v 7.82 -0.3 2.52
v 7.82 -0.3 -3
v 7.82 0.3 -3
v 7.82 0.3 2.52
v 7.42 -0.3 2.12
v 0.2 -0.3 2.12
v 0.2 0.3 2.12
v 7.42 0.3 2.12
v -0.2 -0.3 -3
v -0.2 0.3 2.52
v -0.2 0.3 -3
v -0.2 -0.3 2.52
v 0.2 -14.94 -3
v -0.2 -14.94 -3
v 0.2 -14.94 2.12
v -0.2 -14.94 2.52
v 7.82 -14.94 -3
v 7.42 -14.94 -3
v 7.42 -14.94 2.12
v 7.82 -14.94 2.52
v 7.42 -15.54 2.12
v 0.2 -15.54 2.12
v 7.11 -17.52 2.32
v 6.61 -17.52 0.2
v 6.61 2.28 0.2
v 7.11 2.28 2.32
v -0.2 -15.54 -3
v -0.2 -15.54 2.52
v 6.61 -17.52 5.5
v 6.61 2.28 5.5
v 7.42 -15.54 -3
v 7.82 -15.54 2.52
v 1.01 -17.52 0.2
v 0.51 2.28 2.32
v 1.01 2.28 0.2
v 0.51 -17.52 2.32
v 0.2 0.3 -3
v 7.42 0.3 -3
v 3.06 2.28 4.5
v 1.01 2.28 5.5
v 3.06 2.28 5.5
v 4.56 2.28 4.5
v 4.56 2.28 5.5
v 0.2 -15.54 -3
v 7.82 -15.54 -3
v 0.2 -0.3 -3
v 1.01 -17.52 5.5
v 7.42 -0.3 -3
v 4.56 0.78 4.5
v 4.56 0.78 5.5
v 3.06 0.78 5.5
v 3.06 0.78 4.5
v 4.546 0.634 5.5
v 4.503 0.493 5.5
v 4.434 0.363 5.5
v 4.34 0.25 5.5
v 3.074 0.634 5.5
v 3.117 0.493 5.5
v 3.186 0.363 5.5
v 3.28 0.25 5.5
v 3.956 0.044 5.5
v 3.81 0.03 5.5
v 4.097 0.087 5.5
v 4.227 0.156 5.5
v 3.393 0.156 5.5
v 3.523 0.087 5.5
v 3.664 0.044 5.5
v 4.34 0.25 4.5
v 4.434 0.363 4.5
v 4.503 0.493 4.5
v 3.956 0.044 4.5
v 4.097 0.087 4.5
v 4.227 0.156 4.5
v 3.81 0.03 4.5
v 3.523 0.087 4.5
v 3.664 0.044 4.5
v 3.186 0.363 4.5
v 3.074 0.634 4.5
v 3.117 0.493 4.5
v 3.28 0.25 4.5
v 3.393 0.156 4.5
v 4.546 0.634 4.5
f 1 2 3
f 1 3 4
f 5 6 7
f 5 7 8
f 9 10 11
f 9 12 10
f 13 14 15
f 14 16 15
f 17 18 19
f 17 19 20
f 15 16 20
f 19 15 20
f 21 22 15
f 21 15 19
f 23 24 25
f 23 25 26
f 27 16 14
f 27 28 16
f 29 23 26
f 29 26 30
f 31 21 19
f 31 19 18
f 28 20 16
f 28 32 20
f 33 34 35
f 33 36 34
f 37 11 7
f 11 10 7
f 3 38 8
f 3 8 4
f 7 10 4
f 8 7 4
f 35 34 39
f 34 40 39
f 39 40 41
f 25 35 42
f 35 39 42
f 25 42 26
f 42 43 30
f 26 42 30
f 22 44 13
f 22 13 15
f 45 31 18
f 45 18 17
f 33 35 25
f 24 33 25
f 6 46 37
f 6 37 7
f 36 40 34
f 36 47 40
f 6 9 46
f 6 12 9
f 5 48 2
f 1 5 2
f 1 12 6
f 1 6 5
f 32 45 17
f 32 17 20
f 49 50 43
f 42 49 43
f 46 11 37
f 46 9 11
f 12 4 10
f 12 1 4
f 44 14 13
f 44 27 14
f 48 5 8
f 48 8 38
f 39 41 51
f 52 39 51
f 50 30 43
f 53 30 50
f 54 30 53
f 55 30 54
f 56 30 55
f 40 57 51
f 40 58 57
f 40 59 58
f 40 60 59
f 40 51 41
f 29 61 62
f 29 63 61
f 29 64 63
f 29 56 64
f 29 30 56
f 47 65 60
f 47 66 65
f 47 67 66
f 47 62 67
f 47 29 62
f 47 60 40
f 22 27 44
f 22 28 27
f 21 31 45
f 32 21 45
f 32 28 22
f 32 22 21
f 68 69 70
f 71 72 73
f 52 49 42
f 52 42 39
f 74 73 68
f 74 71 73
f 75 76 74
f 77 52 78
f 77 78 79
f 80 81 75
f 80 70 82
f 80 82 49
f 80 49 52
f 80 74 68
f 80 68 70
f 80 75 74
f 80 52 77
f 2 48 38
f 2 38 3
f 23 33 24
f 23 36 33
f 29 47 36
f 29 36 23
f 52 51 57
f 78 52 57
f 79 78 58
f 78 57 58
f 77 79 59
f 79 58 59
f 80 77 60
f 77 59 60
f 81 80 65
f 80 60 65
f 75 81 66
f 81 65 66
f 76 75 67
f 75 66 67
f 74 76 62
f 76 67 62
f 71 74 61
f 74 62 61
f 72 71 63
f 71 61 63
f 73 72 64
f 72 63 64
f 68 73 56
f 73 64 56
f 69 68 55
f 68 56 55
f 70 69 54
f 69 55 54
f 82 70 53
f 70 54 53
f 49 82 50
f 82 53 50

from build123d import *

# Parameters (mm, degrees)
PAD001_DEPTH = 0.3
PAD002_DEPTH = 0.3
PAD_DEPTH    = 9.9
POCKET_DEPTH = 1


with BuildPart() as pad001:
    # Sketch001 → Pad001 (new body, symmetric)
    with BuildSketch(Plane.XZ):
        Polygon((-0.2, -3), (0.2, -3), (0.2, 2.12), (7.42, 2.12), (7.42, -3), (7.82, -3), (7.82, 2.52), (-0.2, 2.52), align=None)
    extrude(amount=PAD001_DEPTH, both=True)


with BuildPart() as pad002:
    # Sketch002 → Pad002 (new body, symmetric)
    with BuildSketch(Plane.XZ.offset(15.24)):
        Polygon((-0.2, -3), (0.2, -3), (0.2, 2.12), (7.42, 2.12), (7.42, -3), (7.82, -3), (7.82, 2.52), (-0.2, 2.52), align=None)
    extrude(amount=PAD002_DEPTH, both=True)


with BuildPart() as pocket:
    # Sketch → Pad (new body, symmetric)
    with BuildSketch(Plane.XZ.offset(7.62)):
        Polygon((1.01, 0.2), (6.61, 0.2), (7.11, 2.32), (6.61, 5.5), (1.01, 5.5), (0.51, 2.32), align=None)
    extrude(amount=PAD_DEPTH, both=True)

    # Sketch003 → Pocket (cut)
    with BuildSketch(Plane(origin=(0, -7.62, 5.5), x_dir=(-1, 0, 0), z_dir=(0, 0, 1))):
        with BuildLine():
            ThreePointArc((-3.06, -8.4), (-3.81, -7.65), (-4.56, -8.4))
            Line((-4.56, -8.4), (-4.56, -9.9))
            Line((-4.56, -9.9), (-3.06, -9.9))
            Line((-3.06, -9.9), (-3.06, -8.4))
        make_face()
    extrude(amount=-POCKET_DEPTH, mode=Mode.SUBTRACT)


solid = Compound([pad001.part, pad002.part, pocket.part])
